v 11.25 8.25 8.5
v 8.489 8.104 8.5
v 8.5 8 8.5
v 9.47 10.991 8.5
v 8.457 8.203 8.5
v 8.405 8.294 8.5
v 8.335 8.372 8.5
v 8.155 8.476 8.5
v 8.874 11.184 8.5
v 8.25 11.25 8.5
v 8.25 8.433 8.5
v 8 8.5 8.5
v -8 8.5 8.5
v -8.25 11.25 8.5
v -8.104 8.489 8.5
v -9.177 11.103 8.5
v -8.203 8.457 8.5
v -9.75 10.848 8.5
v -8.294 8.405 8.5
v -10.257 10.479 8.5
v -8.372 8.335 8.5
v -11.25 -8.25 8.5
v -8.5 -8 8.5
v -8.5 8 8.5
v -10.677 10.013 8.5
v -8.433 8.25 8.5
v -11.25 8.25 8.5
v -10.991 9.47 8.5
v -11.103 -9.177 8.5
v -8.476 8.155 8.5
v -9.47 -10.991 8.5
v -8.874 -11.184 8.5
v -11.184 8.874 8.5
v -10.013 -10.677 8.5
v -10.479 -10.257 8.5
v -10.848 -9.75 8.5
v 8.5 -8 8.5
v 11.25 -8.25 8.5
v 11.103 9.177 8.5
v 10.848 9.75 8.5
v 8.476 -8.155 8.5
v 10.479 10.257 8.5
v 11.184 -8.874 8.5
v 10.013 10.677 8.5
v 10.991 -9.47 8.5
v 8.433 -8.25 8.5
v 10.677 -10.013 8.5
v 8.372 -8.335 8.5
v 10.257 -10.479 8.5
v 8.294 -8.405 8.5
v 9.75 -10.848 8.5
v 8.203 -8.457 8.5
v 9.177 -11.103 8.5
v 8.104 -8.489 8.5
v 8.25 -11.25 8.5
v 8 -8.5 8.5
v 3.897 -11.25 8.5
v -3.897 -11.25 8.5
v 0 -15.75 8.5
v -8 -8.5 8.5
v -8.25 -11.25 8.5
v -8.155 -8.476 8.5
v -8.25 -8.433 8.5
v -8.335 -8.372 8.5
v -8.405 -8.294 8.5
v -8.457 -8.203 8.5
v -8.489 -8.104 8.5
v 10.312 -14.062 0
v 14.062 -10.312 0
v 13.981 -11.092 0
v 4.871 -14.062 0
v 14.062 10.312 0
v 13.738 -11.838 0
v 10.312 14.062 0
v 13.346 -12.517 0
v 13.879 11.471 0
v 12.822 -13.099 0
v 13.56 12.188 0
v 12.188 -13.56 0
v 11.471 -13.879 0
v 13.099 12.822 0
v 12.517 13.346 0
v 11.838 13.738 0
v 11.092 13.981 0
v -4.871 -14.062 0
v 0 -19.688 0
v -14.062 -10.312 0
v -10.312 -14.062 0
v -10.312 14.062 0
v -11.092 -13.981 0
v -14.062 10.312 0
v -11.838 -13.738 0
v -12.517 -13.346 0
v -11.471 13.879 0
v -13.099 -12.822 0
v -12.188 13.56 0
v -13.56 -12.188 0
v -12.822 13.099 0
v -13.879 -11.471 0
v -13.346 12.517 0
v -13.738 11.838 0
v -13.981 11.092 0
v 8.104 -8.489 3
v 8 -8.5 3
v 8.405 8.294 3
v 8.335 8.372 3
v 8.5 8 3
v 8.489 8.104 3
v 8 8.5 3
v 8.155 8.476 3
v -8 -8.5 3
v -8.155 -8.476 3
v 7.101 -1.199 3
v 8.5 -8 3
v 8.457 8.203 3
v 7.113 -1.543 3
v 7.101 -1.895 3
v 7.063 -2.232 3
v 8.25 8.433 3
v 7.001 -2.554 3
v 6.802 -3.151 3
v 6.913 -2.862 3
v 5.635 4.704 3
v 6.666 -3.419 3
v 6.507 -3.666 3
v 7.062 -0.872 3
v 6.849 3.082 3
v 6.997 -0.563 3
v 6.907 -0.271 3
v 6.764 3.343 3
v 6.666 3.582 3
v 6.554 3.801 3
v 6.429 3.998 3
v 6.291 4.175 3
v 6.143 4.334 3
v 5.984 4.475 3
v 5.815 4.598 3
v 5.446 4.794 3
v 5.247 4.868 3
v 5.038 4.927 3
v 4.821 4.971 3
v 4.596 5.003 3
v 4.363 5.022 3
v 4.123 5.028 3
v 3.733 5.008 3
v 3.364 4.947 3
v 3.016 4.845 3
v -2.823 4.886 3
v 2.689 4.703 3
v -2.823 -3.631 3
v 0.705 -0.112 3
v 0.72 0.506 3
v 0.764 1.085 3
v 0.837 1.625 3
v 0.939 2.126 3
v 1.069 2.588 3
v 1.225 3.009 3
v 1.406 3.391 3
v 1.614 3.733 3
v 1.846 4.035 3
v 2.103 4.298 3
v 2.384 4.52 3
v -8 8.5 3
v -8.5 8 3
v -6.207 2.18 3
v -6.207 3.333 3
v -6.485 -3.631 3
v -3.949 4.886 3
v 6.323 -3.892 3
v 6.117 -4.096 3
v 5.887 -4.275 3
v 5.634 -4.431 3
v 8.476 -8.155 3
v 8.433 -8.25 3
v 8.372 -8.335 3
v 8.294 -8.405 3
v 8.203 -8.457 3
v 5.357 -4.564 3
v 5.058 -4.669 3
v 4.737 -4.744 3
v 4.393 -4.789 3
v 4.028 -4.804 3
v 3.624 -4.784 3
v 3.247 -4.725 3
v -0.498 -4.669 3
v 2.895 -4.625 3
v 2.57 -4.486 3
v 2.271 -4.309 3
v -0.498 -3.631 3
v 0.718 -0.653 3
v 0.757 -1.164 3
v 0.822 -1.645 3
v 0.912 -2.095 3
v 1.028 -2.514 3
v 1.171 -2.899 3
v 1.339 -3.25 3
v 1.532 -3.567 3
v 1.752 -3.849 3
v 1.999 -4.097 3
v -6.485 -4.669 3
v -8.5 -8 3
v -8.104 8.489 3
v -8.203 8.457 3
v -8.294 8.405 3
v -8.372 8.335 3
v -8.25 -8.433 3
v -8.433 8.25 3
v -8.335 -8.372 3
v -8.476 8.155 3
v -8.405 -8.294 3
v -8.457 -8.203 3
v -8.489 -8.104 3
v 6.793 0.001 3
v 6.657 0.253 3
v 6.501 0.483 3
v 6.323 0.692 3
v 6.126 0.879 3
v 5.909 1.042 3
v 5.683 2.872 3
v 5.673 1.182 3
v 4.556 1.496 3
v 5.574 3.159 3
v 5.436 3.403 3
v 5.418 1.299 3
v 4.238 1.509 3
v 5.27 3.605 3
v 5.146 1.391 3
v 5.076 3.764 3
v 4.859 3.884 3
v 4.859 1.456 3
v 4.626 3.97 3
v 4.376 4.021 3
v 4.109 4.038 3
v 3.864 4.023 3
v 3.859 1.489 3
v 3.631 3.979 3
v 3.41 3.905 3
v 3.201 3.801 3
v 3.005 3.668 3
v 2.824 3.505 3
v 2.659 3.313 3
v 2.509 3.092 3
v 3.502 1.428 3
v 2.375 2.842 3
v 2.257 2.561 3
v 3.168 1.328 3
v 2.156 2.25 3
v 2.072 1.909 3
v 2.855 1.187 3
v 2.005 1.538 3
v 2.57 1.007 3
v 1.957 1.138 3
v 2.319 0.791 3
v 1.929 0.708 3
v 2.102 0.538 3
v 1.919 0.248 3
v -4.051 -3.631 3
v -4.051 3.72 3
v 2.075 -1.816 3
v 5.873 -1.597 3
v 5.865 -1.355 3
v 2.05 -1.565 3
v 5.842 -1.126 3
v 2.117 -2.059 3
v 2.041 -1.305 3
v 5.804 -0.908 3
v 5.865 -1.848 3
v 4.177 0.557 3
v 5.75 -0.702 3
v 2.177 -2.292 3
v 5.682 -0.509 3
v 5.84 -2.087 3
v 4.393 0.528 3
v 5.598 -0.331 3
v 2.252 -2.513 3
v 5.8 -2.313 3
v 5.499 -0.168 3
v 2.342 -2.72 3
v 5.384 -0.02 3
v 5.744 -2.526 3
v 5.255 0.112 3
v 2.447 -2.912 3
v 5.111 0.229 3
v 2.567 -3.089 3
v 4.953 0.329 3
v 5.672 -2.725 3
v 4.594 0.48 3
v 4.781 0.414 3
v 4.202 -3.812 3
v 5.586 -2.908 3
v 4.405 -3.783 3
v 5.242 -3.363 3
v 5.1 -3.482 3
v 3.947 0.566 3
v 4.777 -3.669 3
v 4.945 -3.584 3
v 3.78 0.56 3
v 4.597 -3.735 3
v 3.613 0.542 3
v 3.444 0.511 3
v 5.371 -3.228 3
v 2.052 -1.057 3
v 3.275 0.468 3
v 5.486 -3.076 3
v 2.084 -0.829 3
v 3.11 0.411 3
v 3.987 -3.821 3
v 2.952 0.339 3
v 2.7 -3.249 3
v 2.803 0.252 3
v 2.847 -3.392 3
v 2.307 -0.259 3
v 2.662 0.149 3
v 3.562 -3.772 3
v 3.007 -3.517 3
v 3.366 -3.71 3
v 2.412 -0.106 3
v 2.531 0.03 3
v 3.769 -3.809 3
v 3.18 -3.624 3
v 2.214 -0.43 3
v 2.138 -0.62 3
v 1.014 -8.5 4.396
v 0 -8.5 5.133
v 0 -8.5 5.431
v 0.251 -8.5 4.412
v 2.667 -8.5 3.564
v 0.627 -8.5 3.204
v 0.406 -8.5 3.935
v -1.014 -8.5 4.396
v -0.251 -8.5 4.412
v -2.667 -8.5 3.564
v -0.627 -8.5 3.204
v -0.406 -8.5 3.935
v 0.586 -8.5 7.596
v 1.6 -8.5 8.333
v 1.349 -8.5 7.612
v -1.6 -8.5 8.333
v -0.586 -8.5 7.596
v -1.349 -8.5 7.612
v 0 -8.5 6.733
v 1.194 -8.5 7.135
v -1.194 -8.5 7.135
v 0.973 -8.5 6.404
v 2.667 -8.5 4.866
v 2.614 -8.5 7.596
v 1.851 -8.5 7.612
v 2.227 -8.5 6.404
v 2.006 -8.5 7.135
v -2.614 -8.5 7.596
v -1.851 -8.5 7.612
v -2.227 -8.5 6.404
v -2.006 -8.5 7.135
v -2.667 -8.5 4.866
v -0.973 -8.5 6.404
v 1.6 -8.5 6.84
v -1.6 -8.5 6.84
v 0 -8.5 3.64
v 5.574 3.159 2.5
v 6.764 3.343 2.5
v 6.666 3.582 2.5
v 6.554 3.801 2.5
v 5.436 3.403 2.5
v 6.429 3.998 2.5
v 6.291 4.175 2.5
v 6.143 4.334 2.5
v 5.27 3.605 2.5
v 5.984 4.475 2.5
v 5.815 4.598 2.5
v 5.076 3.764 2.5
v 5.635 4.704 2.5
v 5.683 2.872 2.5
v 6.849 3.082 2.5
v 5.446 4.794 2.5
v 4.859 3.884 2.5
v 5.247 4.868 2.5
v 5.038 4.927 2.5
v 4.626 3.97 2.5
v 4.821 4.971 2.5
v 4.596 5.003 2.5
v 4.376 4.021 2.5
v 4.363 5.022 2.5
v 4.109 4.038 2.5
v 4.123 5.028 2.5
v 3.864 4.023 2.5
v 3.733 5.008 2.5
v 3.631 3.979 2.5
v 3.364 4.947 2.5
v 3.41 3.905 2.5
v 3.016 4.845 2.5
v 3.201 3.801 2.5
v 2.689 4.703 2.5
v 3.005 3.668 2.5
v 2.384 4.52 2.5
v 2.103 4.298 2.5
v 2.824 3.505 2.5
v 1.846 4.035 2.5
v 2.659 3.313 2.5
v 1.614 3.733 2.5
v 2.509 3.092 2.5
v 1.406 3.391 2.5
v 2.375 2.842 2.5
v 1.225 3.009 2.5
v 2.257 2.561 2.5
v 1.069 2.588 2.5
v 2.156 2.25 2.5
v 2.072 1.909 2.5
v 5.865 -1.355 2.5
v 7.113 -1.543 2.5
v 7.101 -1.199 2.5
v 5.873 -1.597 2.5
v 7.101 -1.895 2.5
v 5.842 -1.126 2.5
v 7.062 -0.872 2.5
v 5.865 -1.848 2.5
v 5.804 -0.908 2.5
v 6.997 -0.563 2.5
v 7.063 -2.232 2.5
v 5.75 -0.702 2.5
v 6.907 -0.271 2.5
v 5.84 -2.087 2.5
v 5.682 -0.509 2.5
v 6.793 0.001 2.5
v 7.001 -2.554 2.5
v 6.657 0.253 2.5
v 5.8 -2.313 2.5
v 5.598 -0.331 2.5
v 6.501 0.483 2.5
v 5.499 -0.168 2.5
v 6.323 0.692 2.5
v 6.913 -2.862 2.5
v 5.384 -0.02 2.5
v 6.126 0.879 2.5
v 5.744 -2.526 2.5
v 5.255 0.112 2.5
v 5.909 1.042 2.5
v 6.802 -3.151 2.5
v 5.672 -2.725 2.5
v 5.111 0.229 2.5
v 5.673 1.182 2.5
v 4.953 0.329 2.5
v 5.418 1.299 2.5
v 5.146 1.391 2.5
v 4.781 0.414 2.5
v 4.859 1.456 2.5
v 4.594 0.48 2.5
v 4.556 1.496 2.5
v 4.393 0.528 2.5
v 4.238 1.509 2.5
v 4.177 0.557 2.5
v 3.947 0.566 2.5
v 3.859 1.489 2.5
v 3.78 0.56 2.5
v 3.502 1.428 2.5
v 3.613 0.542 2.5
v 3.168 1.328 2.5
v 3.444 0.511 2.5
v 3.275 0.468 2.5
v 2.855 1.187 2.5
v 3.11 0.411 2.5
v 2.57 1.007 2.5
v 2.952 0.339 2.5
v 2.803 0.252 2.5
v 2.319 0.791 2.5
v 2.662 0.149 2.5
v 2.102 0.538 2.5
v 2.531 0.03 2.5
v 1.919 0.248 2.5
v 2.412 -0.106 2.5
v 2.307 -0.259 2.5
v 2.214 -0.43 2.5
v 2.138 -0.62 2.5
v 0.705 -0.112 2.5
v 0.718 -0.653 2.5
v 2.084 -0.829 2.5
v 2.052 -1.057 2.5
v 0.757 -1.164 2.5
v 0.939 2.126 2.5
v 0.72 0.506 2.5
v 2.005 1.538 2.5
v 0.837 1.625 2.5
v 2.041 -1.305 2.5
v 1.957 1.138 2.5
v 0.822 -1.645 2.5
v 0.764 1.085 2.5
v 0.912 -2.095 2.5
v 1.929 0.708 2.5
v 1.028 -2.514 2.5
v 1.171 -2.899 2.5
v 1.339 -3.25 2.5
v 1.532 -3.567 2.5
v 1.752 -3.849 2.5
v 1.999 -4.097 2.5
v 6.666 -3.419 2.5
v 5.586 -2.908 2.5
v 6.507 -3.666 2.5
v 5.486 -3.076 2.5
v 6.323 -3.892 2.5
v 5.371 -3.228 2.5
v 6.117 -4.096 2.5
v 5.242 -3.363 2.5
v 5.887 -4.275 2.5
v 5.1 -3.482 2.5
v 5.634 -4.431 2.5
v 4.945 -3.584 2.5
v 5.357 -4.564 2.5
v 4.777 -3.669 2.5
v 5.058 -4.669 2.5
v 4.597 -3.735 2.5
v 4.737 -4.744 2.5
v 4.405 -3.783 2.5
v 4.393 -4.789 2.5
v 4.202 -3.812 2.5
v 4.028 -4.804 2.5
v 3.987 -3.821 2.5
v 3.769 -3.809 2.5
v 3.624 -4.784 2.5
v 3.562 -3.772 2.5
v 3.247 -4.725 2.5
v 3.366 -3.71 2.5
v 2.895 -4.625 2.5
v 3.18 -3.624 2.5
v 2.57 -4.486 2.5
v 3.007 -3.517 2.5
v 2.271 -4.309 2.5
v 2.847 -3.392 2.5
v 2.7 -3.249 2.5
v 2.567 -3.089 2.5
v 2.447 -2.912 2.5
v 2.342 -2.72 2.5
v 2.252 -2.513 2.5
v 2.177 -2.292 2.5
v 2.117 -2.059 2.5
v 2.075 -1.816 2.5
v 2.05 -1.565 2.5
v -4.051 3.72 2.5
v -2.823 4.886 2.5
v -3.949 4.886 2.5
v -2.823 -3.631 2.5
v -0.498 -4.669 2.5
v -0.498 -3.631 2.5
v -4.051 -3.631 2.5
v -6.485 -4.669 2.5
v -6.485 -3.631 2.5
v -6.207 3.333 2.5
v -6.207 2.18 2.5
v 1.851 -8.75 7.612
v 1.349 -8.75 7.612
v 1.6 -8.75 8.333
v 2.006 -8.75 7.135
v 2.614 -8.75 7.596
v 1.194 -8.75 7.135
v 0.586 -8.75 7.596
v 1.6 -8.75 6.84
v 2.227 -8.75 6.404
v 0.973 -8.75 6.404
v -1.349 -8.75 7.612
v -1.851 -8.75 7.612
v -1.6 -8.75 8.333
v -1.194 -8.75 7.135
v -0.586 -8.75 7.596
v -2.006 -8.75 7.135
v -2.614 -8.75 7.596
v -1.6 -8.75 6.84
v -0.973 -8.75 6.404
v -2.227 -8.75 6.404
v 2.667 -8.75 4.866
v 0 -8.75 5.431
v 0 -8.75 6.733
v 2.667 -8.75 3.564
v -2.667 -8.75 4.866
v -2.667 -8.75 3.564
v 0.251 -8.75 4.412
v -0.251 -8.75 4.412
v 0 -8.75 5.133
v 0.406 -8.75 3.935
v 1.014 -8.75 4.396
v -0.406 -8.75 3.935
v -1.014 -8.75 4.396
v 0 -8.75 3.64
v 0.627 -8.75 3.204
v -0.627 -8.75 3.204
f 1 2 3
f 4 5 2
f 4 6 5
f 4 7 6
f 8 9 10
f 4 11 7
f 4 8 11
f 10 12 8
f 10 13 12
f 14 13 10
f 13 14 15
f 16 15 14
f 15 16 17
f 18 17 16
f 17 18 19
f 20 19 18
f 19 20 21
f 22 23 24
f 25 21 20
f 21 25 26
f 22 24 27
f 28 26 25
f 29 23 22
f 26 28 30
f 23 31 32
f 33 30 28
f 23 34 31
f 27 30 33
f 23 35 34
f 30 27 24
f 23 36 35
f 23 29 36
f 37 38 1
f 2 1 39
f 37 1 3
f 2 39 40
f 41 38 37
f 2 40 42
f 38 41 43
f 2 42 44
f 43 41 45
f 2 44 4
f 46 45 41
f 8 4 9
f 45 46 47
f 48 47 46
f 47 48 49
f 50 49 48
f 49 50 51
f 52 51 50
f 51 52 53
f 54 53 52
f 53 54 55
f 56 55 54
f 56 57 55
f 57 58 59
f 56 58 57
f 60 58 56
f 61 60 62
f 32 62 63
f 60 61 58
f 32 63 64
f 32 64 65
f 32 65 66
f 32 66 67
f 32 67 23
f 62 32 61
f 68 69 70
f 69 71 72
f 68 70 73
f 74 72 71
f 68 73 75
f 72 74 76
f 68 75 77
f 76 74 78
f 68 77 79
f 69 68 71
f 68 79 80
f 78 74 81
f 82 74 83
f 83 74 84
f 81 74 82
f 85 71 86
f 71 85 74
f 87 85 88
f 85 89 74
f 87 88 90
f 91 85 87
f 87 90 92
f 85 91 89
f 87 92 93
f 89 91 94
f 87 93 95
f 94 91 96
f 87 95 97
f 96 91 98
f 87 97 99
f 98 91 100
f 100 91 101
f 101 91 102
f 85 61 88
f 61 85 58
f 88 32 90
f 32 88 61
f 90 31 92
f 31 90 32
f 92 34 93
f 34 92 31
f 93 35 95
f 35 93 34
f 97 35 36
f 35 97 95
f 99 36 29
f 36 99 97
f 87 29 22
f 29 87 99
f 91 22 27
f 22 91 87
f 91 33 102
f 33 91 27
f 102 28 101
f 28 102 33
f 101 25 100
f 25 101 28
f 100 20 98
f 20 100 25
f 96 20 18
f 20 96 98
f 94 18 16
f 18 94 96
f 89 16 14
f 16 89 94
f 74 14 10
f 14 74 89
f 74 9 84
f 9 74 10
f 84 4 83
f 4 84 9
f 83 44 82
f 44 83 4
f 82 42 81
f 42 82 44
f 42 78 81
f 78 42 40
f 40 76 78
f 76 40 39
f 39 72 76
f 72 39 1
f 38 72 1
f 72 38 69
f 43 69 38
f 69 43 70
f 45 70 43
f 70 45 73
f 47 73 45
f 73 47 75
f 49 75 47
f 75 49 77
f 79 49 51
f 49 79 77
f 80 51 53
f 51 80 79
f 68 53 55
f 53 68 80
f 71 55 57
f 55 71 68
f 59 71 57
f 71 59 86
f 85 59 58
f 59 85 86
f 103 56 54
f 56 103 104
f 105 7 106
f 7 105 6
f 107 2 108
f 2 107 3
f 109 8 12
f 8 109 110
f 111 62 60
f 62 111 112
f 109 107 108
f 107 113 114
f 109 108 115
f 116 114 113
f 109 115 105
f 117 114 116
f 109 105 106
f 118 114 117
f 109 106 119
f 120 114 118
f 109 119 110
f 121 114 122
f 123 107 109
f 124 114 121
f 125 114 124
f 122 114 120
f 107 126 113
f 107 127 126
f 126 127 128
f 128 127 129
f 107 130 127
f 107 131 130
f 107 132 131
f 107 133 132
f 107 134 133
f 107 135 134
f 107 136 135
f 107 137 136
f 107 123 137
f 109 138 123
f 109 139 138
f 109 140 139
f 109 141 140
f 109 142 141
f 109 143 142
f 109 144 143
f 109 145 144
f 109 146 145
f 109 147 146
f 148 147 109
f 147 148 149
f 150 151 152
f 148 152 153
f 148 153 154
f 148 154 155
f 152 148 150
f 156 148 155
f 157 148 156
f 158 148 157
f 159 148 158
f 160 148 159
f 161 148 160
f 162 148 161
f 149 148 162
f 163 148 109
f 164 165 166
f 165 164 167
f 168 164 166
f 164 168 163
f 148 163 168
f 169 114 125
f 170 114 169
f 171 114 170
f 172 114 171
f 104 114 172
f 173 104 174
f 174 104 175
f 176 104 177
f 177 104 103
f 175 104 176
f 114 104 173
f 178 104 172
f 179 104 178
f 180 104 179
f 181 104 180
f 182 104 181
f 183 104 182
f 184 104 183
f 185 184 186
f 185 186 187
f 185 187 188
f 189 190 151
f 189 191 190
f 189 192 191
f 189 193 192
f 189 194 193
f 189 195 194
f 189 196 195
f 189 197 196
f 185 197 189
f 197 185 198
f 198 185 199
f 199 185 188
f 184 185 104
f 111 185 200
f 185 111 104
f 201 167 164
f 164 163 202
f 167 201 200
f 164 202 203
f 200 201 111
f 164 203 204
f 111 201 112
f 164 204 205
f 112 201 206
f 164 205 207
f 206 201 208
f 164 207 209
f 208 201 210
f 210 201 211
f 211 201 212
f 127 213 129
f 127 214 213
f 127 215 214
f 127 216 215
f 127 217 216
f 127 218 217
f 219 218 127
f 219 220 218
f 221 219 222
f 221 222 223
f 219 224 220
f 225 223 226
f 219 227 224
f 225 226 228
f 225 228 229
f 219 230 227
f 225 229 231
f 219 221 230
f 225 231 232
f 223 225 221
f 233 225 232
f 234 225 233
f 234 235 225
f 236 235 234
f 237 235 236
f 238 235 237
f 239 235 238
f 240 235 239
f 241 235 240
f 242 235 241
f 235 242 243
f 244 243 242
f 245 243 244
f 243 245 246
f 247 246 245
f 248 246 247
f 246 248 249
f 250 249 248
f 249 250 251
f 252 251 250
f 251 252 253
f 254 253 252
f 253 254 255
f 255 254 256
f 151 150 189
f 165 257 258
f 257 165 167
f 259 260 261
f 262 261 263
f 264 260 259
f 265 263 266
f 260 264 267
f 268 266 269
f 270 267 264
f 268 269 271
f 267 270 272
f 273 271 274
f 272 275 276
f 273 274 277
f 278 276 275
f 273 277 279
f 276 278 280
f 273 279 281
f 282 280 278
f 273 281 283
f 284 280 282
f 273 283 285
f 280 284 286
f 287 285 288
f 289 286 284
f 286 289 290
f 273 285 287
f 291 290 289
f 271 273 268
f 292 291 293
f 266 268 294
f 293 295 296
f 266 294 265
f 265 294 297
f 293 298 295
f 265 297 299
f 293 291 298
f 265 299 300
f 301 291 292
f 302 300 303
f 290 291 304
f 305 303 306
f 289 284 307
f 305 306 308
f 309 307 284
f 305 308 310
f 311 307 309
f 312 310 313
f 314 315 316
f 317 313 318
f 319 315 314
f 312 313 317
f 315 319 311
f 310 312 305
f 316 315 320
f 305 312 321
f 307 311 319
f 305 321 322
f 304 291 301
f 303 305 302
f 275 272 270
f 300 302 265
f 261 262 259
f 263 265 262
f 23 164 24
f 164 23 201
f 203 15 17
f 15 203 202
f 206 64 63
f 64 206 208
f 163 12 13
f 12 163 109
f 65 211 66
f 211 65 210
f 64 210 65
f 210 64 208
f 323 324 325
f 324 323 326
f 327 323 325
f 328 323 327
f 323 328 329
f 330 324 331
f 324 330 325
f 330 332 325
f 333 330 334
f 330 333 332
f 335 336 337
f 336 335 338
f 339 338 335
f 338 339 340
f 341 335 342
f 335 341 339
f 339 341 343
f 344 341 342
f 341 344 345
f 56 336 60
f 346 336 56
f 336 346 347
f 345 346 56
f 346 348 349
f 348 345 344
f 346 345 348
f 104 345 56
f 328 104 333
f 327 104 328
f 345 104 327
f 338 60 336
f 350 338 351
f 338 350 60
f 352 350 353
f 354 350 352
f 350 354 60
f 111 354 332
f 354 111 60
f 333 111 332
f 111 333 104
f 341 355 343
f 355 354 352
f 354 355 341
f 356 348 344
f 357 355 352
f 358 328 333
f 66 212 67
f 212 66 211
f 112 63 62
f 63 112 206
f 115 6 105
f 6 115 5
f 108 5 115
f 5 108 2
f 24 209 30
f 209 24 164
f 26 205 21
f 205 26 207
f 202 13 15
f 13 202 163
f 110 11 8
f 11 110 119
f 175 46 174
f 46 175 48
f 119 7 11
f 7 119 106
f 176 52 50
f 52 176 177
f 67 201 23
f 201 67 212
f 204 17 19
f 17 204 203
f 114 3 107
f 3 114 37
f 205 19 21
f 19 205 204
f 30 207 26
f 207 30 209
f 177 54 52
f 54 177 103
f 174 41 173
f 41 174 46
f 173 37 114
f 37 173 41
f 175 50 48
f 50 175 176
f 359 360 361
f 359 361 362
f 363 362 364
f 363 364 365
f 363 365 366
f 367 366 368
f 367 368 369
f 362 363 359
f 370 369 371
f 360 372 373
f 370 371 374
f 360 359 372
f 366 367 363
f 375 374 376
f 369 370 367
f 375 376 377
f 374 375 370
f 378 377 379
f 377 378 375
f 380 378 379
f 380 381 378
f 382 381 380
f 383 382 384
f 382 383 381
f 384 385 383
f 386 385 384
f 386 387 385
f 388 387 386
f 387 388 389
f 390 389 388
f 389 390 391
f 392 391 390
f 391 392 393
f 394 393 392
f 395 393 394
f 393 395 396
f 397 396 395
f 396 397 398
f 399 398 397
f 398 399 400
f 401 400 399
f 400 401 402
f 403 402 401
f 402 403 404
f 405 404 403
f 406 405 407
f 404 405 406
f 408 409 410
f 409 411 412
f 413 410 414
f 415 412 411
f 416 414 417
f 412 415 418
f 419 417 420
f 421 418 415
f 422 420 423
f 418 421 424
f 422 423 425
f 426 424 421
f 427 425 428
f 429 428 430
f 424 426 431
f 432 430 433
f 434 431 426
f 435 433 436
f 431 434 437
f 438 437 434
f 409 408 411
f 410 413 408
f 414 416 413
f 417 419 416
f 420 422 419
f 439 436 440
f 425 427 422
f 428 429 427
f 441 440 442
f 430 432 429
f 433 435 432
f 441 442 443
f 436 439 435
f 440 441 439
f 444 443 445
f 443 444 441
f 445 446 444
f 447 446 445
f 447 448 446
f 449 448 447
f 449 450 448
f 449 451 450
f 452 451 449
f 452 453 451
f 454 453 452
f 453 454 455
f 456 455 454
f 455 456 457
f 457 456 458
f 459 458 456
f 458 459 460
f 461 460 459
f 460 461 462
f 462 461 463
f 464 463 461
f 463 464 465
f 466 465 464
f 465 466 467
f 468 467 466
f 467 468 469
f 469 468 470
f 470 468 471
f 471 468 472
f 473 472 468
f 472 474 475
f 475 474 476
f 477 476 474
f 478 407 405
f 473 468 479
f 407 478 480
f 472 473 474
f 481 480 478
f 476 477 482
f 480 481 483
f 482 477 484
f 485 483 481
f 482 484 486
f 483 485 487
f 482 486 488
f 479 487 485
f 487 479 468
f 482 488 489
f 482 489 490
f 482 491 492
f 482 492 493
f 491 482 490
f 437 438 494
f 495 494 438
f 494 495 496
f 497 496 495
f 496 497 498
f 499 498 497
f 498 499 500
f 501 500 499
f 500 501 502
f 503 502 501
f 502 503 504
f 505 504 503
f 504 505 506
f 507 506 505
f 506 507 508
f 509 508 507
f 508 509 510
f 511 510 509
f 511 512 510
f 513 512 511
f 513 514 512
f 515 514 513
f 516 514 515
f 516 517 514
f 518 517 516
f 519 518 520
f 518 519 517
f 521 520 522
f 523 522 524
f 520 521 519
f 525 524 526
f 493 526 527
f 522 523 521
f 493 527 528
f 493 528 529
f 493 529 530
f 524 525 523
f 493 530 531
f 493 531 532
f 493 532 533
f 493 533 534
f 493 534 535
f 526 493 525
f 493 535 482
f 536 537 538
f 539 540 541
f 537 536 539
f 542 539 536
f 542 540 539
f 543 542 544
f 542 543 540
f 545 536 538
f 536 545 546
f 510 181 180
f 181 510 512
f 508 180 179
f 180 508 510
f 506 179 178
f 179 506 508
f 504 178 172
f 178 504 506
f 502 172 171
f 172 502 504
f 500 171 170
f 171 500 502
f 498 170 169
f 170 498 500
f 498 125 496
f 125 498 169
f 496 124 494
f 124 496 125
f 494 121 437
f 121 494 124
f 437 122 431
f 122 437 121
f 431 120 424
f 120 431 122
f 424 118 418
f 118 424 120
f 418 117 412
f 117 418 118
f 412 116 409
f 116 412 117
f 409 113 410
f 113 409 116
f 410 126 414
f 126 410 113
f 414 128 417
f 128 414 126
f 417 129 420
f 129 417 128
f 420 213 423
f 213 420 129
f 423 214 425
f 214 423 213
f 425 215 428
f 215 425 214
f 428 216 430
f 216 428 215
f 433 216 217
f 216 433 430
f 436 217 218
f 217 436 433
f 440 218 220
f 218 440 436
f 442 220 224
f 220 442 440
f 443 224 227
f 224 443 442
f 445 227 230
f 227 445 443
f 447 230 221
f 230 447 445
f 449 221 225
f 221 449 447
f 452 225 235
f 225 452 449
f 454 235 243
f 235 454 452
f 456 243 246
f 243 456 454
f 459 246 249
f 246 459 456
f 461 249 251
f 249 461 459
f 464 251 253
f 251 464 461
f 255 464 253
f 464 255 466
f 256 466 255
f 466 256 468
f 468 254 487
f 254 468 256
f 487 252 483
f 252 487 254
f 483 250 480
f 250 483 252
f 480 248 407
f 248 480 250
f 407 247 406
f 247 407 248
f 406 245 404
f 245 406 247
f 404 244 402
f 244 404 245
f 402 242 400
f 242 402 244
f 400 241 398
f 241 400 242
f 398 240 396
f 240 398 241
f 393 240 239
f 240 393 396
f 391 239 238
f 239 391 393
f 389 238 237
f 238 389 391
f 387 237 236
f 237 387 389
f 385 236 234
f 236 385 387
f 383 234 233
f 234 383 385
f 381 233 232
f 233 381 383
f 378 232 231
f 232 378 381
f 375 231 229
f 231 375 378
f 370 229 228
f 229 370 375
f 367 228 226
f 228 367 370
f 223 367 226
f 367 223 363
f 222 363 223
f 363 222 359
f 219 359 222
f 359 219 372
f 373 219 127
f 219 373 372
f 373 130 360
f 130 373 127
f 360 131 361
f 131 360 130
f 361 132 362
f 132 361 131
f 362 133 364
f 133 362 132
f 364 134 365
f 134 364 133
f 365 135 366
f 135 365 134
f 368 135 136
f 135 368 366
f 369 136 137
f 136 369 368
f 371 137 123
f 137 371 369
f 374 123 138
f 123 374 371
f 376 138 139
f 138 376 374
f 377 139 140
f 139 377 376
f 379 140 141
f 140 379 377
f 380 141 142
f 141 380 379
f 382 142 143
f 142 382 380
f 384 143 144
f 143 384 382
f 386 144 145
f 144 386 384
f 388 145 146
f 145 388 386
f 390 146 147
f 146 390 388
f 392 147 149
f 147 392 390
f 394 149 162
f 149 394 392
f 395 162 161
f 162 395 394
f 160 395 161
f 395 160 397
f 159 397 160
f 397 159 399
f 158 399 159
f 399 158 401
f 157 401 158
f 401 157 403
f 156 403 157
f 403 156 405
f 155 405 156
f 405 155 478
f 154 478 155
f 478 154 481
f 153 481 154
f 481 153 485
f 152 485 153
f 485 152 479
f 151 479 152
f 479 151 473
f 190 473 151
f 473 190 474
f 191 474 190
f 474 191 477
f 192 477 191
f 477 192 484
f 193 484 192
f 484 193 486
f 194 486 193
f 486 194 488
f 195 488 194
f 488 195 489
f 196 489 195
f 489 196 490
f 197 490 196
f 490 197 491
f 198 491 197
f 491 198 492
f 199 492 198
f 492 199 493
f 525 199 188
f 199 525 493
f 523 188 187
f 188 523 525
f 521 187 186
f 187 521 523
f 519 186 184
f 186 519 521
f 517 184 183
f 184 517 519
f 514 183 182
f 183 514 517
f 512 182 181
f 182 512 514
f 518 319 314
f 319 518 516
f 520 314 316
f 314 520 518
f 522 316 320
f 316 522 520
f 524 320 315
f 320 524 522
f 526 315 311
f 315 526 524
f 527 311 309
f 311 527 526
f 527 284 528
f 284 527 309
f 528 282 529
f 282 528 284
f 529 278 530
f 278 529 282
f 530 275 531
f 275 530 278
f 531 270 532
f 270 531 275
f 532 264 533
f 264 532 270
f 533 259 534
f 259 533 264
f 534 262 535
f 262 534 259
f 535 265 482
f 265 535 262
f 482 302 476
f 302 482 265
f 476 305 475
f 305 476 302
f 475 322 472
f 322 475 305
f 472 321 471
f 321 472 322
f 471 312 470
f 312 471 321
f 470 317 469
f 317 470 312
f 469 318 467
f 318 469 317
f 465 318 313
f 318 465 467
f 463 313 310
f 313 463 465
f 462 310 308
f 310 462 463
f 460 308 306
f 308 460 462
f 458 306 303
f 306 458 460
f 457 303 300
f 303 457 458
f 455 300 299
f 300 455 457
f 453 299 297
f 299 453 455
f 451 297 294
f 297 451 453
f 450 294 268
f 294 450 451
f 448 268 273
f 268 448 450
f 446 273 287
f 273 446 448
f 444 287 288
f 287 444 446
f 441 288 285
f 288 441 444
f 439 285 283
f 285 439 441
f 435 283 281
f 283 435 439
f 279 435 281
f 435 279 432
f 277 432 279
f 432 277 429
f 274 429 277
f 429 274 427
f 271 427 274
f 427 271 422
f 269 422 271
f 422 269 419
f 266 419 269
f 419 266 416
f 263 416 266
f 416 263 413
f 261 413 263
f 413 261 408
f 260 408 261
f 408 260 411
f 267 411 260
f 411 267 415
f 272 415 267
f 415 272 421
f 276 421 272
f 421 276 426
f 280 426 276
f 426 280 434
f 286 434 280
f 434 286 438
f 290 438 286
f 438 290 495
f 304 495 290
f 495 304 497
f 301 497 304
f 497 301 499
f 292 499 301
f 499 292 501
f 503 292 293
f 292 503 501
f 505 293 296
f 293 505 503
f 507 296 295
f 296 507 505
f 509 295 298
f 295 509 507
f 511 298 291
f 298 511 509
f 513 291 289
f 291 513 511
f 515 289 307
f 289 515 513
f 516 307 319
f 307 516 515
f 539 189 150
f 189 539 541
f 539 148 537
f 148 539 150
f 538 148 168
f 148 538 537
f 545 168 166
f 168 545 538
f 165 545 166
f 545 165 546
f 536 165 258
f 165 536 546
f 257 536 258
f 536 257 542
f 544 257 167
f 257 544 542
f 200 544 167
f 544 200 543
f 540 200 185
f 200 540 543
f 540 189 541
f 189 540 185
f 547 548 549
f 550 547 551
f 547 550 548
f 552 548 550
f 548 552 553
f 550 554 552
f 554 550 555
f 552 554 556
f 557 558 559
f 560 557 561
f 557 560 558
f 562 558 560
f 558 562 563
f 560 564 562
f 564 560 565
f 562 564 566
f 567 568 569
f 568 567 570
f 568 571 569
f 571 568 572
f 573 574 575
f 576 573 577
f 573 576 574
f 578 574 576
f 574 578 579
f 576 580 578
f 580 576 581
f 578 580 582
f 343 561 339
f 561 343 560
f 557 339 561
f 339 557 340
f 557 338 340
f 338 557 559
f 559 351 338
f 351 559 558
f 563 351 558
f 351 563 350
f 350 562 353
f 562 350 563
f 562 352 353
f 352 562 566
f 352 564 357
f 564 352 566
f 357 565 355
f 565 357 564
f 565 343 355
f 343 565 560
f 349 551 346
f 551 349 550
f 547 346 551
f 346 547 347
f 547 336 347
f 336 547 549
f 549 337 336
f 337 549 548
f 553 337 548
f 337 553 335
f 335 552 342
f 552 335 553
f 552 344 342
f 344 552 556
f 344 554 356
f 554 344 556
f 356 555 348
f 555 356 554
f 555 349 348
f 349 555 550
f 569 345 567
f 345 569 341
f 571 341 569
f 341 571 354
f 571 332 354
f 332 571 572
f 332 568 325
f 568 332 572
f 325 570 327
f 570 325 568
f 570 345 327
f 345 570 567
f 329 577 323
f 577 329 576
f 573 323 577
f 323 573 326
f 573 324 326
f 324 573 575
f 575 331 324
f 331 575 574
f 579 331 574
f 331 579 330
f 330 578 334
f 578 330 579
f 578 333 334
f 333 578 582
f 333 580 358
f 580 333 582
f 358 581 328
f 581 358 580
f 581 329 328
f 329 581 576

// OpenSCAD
// Cubic Dice Holder

//Size of die in mm
Size=16;
//Normally want to give the die some room to slide in and out easily but maybe you have a different idea
Fit=0.5; //[0:Tight,0.25:Snug,0.5:Loose]
//Mark the bottom of the well with the die size?
Tagged=1; //[0:No,1:Yes]
//Thickness of the wall at the top of the die holder.
WallThickness=3;
//Add an arrow to the south side as an indicator.
Arrow=2; //[0:None,1:Style 1, 2:Style 2]
// Hard or rounded corners
CornerStyle=0;//[0:Round,1:Hard]

DieSize=Size+Fit;

/*
difference(){
 union(){
  linear_extrude(height=DieSize*2,scale=0) {
   union(){
    intersection(){
     square(DieSize+4*WallThickness,center=true);
     rotate([0,0,45]) square((DieSize+6*WallThickness)*1.0, center=true);
    }
    if (Arrow==2){
     translate([0,-DieSize/2-WallThickness*2.5,0]) rotate([0,0,-90]) scale([1,1.5,1]) circle(r=WallThickness,$fn=3); 
    }
   }
  }
  if (Arrow==1){
   linear_extrude(height=DieSize,scale=0) translate([0,-DieSize/2-WallThickness*2.5,0]) rotate([0,0,-90]) scale([1,1.5,1]) circle(r=WallThickness,$fn=3); 
  }
 }
 translate([0,0,DieSize/2+WallThickness]) cube(DieSize, center=true);
 translate([0,0,DieSize*1.33+WallThickness]) cube(DieSize*2,center=true);
 if (Tagged) translate([0,0,WallThickness]) linear_extrude(height=1, center=true) text(str(Size), size=Size/16*10, halign="center", valign="center");
}
*/

HeightFactor=3;

function from_polar(r=1,theta=60) = [r*cos(theta),r*sin(theta)];

module star_5(radius=10,inner=0.4){
 polygon([
  from_polar(radius,0),
  from_polar(radius*inner,36),
  from_polar(radius,72),
  from_polar(radius*inner,72+36),
  from_polar(radius,72*2),
  from_polar(radius*inner,72*2+36),
  from_polar(radius,72*3),
  from_polar(radius*inner,72*3+36),
  from_polar(radius,72*4),
  from_polar(radius*inner,72*4+36)]
 );
}

module CCTag2D(Size=20, Border=true){
 BorderWidth=(Size>=20)&&Border?Size/20:0;
 ESize=Size-4*BorderWidth;
 StarSize=ESize/5;
 ChevronWidth=ESize/5;
 ChevronAngle=35;
 
 intersection(){
  union(){
   // actual tag elements:
   translate([0,-ESize/2+StarSize,0]) rotate([0,0,90]) star_5(StarSize);
   translate([-ESize/2+StarSize,ESize/2-StarSize,0]) rotate([0,0,90]) star_5(StarSize);
   translate([ESize/2-StarSize,ESize/2-StarSize,0]) rotate([0,0,90]) star_5(StarSize);
   translate([0,ChevronWidth,0]) for (i=[0,1]) mirror([i,0,0]) rotate([0,0,-ChevronAngle]) translate([0,-ChevronWidth]) square([ESize,ChevronWidth]);
  }
  square(ESize,center=true);
 }
 if (BorderWidth){
  difference(){
   square(Size,center=true);
   square(Size-BorderWidth*2,center=true);
  }
 }
}

$fn=30;
difference(){
 union(){
  translate([0,0,DieSize/HeightFactor+WallThickness])
   rotate([180,0,180])
    linear_extrude(height=DieSize/HeightFactor+WallThickness, scale=1.25){
     if (CornerStyle){
      offset(delta=WallThickness,chamfer=true) square(DieSize,center=true);
     }
     else {
      offset(r=WallThickness,chamfer=true) square(DieSize,center=true);
     }
     if (Arrow==2)
      translate([0,-DieSize/2-WallThickness*1.5,0]) rotate([0,0,-90]) scale([1,1.5,1]) circle(r=WallThickness,$fn=3); 
    }
   if (Arrow==1){
    intersection(){
     linear_extrude(height=DieSize,scale=0) translate([0,-DieSize/2-WallThickness*2.5,0]) rotate([0,0,-90]) scale([1,1.5,1]) circle(r=WallThickness,$fn=3); 
     cube([DieSize*2,DieSize*3,DieSize], center=true);
    }
   }
  }

 //Cutouts:
 translate([0,0,WallThickness]) linear_extrude(height=DieSize) 
  if (CornerStyle){
   offset(delta=Fit, chamfer=true) square(Size,center=true);
  }
  else{
   offset(r=Fit, chamfer=true) square(Size,center=true);
  }
  if (Tagged) translate([0,0,WallThickness]) linear_extrude(height=1, center=true) text(str(round(Size)), size=Size/16*10, halign="center", valign="center");
  translate([0,-Size/2-Fit,Size/HeightFactor/2+WallThickness]) rotate([90,0,0]) linear_extrude(height=0.5,center=true) CCTag2D(Size/HeightFactor);
}



